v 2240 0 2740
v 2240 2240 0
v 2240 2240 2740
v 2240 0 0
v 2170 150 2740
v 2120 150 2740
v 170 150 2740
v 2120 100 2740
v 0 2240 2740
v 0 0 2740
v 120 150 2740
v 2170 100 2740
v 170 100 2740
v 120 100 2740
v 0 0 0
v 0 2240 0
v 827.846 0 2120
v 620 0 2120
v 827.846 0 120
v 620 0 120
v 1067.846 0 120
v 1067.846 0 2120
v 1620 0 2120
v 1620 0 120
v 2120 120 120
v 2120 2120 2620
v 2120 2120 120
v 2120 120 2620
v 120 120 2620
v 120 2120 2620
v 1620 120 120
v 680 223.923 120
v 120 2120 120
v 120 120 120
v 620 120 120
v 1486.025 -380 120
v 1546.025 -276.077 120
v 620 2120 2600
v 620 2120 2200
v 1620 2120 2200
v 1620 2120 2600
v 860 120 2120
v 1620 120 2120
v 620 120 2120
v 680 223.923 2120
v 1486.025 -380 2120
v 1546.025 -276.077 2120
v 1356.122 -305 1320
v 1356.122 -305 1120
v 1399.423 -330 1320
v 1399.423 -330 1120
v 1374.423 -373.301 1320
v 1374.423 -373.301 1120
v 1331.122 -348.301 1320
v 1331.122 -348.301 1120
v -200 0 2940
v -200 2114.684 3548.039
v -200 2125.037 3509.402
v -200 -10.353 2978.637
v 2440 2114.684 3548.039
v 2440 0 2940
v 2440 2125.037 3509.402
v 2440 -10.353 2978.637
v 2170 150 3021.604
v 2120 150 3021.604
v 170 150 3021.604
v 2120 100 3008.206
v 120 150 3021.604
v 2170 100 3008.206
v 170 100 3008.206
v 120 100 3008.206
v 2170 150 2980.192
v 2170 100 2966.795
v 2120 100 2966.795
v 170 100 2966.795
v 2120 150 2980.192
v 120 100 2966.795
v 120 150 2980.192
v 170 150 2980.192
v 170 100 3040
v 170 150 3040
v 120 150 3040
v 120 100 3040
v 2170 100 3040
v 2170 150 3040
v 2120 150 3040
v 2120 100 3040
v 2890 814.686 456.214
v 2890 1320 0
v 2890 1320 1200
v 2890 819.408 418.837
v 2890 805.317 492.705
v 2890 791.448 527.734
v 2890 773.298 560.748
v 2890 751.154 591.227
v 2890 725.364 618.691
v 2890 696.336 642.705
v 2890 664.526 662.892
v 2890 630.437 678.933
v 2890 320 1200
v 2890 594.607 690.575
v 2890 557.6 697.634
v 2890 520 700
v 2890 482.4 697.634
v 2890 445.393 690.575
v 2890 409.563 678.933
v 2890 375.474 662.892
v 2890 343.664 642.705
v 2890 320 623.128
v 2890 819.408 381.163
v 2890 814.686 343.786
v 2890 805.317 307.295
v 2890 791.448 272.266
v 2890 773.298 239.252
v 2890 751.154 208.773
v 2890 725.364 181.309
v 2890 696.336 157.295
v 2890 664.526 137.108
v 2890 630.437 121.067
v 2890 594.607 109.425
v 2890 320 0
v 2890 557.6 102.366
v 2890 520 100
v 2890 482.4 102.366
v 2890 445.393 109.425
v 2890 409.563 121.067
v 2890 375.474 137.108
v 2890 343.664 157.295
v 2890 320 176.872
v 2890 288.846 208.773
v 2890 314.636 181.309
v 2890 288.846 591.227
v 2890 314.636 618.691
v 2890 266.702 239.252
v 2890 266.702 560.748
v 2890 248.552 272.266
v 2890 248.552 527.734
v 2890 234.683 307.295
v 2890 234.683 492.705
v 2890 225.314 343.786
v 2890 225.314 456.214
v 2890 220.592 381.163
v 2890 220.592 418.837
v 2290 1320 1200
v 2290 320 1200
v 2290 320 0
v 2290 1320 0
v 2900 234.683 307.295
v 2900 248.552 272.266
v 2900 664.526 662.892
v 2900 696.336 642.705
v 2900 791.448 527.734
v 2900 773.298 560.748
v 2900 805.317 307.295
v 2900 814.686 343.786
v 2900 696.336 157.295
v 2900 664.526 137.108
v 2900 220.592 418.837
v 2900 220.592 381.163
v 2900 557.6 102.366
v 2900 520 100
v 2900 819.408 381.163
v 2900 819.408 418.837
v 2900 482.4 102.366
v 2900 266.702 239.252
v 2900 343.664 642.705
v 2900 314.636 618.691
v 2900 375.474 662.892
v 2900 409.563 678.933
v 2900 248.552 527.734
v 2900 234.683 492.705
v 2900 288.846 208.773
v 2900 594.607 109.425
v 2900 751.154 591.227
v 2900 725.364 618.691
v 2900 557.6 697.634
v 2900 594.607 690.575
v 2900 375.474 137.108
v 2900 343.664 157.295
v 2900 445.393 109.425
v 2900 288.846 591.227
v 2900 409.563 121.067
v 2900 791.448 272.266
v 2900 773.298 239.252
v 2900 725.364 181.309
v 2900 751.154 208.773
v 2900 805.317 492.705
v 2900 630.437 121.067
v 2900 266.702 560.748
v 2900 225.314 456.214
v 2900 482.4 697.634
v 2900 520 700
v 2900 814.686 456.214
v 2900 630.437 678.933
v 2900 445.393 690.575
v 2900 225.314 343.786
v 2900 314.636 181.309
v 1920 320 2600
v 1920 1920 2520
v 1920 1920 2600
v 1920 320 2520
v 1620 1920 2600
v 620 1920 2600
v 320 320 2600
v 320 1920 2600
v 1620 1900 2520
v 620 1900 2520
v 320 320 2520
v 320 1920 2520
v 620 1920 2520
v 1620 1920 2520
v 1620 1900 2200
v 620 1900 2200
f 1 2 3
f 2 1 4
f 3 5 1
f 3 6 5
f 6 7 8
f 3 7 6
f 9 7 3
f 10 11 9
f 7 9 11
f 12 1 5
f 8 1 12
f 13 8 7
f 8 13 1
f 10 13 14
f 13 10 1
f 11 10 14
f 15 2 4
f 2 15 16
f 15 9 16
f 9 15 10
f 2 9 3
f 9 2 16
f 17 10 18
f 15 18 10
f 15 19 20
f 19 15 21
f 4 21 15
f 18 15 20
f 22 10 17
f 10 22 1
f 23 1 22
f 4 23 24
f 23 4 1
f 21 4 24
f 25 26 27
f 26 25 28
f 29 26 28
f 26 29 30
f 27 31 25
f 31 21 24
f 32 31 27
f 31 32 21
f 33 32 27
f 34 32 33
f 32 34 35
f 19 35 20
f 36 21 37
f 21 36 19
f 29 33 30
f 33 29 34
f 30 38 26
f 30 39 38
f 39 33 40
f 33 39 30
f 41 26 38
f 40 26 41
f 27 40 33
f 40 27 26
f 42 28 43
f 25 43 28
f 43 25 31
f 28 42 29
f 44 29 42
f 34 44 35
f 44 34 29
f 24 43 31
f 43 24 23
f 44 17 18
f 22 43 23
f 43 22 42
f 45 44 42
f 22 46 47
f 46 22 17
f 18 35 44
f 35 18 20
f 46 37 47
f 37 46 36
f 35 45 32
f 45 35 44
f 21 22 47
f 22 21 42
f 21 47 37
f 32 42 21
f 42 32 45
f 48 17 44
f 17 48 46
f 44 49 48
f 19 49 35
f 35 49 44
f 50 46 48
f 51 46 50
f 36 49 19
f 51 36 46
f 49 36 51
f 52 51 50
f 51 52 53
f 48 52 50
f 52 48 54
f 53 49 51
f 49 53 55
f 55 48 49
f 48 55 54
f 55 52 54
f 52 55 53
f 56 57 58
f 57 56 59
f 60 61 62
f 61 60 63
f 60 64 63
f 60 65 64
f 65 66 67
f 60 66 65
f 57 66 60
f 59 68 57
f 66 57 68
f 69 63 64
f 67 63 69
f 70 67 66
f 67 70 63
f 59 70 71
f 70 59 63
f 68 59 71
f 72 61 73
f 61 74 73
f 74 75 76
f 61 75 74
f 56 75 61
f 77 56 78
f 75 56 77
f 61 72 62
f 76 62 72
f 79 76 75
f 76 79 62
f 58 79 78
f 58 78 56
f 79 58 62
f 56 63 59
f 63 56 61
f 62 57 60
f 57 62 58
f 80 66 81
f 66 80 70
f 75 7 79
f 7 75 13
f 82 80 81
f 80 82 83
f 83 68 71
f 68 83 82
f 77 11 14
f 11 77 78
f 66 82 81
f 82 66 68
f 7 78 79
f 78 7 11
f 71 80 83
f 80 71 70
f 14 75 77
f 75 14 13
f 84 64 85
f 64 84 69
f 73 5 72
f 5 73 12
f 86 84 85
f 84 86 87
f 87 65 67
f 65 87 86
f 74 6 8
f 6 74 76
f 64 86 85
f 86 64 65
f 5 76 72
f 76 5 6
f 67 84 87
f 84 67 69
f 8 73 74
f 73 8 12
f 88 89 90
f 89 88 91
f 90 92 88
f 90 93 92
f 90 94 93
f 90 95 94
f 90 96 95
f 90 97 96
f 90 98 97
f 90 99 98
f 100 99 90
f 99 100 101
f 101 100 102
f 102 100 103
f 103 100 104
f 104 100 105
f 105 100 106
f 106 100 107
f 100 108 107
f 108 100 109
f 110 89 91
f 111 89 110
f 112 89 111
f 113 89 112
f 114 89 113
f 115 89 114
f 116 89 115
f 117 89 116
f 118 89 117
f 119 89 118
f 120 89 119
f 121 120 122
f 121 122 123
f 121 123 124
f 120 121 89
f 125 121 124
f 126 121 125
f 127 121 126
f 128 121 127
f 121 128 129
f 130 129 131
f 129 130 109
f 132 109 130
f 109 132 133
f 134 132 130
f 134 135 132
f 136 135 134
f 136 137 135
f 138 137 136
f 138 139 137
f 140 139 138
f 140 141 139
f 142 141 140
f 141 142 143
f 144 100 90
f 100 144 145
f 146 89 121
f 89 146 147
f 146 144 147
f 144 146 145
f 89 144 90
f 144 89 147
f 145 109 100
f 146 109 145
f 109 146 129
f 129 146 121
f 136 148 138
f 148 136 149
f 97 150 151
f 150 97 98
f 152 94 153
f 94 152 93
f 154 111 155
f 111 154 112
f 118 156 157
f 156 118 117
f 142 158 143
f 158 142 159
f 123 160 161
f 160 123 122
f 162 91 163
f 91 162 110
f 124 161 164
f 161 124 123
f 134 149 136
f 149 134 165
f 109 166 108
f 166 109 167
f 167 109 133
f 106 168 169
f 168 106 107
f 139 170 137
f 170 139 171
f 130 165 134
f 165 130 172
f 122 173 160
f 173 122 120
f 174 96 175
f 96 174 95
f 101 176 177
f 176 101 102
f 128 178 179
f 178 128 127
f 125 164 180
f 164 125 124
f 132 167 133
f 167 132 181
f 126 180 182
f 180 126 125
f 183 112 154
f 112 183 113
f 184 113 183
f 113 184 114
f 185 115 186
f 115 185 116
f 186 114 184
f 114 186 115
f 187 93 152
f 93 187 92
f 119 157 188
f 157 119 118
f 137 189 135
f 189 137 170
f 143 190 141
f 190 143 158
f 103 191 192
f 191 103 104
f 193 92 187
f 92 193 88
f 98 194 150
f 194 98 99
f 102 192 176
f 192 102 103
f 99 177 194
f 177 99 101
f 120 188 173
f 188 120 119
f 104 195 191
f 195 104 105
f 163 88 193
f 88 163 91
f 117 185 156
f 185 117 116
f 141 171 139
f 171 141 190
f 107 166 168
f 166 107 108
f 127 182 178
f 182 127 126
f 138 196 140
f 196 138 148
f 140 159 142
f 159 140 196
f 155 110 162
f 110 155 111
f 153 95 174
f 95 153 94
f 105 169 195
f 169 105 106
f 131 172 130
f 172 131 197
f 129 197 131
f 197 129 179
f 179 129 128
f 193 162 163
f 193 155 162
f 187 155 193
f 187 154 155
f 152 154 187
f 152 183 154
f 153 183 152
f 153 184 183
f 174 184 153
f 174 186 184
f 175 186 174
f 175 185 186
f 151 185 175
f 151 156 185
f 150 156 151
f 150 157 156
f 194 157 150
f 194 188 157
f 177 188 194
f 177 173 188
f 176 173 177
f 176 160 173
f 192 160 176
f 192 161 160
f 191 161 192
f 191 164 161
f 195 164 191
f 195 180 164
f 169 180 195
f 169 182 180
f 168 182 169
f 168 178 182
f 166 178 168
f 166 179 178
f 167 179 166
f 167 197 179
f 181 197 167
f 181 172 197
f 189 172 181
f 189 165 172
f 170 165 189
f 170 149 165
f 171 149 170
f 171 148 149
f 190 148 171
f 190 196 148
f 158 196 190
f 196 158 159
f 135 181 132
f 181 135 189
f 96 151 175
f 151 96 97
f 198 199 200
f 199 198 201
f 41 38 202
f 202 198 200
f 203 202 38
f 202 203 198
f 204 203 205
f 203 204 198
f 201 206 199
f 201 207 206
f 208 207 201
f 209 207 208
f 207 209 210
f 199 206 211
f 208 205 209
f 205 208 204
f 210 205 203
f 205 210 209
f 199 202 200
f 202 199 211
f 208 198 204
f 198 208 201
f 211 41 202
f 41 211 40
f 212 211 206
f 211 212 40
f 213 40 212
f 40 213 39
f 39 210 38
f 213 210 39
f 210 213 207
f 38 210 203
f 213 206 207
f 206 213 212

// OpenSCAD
// SIH26005: 3D CAD Model for Solar-PCM Cold Storage
// 1 Metric Ton Capacity
// Units: Millimeters (mm)

// Variables
room_width = 2000;
room_length = 2000;
room_height = 2500;
puf_thickness = 120; // 120mm PUF Panels

// Colors
color_puf = [0.9, 0.9, 0.9, 0.8]; // Off-white, slightly transparent to see inside
color_solar = [0.1, 0.2, 0.5, 1]; // Dark Blue
color_pcm = [0.4, 0.7, 1.0, 1];   // Ice Blue
color_compressor = [0.3, 0.3, 0.3, 1]; // Dark Grey
color_door_handle = [0.8, 0.2, 0.2, 1]; // Red

module puf_room() {
    // Main outer body (transparent PUF)
    color(color_puf) {
        difference() {
            // Outer cube
            cube([room_width + (puf_thickness*2), room_length + (puf_thickness*2), room_height + (puf_thickness*2)]);

            // Inner hollow space
            translate([puf_thickness, puf_thickness, puf_thickness])
                cube([room_width, room_length, room_height]);

            // Door Cutout (Front Wall)
            translate([puf_thickness + 500, -10, puf_thickness])
                cube([1000, puf_thickness + 20, 2000]);
        }
    }
}

module insulated_door() {
    // The Door (shown slightly open for 3D effect)
    translate([puf_thickness + 500, puf_thickness, puf_thickness])
    rotate([0, 0, -30]) // 30 degrees open
    union() {
        color([0.85, 0.85, 0.85, 1])
        cube([1000, puf_thickness, 2000]); // Door Body

        // Door Handle
        color(color_door_handle)
        translate([850, -50, 1000])
        cube([50, 50, 200]);
    }
}

module pcm_flats() {
    // Ceiling Mounted PCM Battery (Stage 3)
    // Placed inside at the top
    color(color_pcm)
    translate([puf_thickness + 200, puf_thickness + 200, puf_thickness + room_height - 100])
    cube([room_width - 400, room_length - 400, 80]); // 80mm thick PCM layer
}

module solar_array() {
    // 3.5 kW Solar Array on top
    // Tilted for sun exposure
    color(color_solar)
    translate([-200, 0, room_height + (puf_thickness*2) + 200])
    rotate([15, 0, 0]) // 15 degree tilt
    cube([room_width + 400 + (puf_thickness*2), room_length + 200, 40]);

    // Solar mounting brackets
    color([0.5, 0.5, 0.5, 1])
    translate([puf_thickness, 100, room_height + (puf_thickness*2)])
    cube([50, 50, 300]);

    color([0.5, 0.5, 0.5, 1])
    translate([puf_thickness + room_width, 100, room_height + (puf_thickness*2)])
    cube([50, 50, 300]);
}

module external_compressor_unit() {
    // Stage 1 & 2: Compressor and Battery Unit
    // Mounted on the right side exterior
    color(color_compressor)
    translate([room_width + (puf_thickness*2) + 50, puf_thickness + 200, 0])
    cube([600, 1000, 1200]);

    // Fan grill detail on compressor
    color([0.1, 0.1, 0.1, 1])
    translate([room_width + (puf_thickness*2) + 650, puf_thickness + 400, 400])
    rotate([0, 90, 0])
    cylinder(h=10, r=300, $fn=50);
}

module internal_evaporator() {
    // Evaporator blowing cold air over PCM
    color([0.7, 0.7, 0.7, 1])
    translate([puf_thickness + 500, room_length - 100, room_height - 300])
    cube([1000, 300, 400]);
}

// Assemble the Final Model
puf_room();
insulated_door();
pcm_flats();
solar_array();
external_compressor_unit();
internal_evaporator();
